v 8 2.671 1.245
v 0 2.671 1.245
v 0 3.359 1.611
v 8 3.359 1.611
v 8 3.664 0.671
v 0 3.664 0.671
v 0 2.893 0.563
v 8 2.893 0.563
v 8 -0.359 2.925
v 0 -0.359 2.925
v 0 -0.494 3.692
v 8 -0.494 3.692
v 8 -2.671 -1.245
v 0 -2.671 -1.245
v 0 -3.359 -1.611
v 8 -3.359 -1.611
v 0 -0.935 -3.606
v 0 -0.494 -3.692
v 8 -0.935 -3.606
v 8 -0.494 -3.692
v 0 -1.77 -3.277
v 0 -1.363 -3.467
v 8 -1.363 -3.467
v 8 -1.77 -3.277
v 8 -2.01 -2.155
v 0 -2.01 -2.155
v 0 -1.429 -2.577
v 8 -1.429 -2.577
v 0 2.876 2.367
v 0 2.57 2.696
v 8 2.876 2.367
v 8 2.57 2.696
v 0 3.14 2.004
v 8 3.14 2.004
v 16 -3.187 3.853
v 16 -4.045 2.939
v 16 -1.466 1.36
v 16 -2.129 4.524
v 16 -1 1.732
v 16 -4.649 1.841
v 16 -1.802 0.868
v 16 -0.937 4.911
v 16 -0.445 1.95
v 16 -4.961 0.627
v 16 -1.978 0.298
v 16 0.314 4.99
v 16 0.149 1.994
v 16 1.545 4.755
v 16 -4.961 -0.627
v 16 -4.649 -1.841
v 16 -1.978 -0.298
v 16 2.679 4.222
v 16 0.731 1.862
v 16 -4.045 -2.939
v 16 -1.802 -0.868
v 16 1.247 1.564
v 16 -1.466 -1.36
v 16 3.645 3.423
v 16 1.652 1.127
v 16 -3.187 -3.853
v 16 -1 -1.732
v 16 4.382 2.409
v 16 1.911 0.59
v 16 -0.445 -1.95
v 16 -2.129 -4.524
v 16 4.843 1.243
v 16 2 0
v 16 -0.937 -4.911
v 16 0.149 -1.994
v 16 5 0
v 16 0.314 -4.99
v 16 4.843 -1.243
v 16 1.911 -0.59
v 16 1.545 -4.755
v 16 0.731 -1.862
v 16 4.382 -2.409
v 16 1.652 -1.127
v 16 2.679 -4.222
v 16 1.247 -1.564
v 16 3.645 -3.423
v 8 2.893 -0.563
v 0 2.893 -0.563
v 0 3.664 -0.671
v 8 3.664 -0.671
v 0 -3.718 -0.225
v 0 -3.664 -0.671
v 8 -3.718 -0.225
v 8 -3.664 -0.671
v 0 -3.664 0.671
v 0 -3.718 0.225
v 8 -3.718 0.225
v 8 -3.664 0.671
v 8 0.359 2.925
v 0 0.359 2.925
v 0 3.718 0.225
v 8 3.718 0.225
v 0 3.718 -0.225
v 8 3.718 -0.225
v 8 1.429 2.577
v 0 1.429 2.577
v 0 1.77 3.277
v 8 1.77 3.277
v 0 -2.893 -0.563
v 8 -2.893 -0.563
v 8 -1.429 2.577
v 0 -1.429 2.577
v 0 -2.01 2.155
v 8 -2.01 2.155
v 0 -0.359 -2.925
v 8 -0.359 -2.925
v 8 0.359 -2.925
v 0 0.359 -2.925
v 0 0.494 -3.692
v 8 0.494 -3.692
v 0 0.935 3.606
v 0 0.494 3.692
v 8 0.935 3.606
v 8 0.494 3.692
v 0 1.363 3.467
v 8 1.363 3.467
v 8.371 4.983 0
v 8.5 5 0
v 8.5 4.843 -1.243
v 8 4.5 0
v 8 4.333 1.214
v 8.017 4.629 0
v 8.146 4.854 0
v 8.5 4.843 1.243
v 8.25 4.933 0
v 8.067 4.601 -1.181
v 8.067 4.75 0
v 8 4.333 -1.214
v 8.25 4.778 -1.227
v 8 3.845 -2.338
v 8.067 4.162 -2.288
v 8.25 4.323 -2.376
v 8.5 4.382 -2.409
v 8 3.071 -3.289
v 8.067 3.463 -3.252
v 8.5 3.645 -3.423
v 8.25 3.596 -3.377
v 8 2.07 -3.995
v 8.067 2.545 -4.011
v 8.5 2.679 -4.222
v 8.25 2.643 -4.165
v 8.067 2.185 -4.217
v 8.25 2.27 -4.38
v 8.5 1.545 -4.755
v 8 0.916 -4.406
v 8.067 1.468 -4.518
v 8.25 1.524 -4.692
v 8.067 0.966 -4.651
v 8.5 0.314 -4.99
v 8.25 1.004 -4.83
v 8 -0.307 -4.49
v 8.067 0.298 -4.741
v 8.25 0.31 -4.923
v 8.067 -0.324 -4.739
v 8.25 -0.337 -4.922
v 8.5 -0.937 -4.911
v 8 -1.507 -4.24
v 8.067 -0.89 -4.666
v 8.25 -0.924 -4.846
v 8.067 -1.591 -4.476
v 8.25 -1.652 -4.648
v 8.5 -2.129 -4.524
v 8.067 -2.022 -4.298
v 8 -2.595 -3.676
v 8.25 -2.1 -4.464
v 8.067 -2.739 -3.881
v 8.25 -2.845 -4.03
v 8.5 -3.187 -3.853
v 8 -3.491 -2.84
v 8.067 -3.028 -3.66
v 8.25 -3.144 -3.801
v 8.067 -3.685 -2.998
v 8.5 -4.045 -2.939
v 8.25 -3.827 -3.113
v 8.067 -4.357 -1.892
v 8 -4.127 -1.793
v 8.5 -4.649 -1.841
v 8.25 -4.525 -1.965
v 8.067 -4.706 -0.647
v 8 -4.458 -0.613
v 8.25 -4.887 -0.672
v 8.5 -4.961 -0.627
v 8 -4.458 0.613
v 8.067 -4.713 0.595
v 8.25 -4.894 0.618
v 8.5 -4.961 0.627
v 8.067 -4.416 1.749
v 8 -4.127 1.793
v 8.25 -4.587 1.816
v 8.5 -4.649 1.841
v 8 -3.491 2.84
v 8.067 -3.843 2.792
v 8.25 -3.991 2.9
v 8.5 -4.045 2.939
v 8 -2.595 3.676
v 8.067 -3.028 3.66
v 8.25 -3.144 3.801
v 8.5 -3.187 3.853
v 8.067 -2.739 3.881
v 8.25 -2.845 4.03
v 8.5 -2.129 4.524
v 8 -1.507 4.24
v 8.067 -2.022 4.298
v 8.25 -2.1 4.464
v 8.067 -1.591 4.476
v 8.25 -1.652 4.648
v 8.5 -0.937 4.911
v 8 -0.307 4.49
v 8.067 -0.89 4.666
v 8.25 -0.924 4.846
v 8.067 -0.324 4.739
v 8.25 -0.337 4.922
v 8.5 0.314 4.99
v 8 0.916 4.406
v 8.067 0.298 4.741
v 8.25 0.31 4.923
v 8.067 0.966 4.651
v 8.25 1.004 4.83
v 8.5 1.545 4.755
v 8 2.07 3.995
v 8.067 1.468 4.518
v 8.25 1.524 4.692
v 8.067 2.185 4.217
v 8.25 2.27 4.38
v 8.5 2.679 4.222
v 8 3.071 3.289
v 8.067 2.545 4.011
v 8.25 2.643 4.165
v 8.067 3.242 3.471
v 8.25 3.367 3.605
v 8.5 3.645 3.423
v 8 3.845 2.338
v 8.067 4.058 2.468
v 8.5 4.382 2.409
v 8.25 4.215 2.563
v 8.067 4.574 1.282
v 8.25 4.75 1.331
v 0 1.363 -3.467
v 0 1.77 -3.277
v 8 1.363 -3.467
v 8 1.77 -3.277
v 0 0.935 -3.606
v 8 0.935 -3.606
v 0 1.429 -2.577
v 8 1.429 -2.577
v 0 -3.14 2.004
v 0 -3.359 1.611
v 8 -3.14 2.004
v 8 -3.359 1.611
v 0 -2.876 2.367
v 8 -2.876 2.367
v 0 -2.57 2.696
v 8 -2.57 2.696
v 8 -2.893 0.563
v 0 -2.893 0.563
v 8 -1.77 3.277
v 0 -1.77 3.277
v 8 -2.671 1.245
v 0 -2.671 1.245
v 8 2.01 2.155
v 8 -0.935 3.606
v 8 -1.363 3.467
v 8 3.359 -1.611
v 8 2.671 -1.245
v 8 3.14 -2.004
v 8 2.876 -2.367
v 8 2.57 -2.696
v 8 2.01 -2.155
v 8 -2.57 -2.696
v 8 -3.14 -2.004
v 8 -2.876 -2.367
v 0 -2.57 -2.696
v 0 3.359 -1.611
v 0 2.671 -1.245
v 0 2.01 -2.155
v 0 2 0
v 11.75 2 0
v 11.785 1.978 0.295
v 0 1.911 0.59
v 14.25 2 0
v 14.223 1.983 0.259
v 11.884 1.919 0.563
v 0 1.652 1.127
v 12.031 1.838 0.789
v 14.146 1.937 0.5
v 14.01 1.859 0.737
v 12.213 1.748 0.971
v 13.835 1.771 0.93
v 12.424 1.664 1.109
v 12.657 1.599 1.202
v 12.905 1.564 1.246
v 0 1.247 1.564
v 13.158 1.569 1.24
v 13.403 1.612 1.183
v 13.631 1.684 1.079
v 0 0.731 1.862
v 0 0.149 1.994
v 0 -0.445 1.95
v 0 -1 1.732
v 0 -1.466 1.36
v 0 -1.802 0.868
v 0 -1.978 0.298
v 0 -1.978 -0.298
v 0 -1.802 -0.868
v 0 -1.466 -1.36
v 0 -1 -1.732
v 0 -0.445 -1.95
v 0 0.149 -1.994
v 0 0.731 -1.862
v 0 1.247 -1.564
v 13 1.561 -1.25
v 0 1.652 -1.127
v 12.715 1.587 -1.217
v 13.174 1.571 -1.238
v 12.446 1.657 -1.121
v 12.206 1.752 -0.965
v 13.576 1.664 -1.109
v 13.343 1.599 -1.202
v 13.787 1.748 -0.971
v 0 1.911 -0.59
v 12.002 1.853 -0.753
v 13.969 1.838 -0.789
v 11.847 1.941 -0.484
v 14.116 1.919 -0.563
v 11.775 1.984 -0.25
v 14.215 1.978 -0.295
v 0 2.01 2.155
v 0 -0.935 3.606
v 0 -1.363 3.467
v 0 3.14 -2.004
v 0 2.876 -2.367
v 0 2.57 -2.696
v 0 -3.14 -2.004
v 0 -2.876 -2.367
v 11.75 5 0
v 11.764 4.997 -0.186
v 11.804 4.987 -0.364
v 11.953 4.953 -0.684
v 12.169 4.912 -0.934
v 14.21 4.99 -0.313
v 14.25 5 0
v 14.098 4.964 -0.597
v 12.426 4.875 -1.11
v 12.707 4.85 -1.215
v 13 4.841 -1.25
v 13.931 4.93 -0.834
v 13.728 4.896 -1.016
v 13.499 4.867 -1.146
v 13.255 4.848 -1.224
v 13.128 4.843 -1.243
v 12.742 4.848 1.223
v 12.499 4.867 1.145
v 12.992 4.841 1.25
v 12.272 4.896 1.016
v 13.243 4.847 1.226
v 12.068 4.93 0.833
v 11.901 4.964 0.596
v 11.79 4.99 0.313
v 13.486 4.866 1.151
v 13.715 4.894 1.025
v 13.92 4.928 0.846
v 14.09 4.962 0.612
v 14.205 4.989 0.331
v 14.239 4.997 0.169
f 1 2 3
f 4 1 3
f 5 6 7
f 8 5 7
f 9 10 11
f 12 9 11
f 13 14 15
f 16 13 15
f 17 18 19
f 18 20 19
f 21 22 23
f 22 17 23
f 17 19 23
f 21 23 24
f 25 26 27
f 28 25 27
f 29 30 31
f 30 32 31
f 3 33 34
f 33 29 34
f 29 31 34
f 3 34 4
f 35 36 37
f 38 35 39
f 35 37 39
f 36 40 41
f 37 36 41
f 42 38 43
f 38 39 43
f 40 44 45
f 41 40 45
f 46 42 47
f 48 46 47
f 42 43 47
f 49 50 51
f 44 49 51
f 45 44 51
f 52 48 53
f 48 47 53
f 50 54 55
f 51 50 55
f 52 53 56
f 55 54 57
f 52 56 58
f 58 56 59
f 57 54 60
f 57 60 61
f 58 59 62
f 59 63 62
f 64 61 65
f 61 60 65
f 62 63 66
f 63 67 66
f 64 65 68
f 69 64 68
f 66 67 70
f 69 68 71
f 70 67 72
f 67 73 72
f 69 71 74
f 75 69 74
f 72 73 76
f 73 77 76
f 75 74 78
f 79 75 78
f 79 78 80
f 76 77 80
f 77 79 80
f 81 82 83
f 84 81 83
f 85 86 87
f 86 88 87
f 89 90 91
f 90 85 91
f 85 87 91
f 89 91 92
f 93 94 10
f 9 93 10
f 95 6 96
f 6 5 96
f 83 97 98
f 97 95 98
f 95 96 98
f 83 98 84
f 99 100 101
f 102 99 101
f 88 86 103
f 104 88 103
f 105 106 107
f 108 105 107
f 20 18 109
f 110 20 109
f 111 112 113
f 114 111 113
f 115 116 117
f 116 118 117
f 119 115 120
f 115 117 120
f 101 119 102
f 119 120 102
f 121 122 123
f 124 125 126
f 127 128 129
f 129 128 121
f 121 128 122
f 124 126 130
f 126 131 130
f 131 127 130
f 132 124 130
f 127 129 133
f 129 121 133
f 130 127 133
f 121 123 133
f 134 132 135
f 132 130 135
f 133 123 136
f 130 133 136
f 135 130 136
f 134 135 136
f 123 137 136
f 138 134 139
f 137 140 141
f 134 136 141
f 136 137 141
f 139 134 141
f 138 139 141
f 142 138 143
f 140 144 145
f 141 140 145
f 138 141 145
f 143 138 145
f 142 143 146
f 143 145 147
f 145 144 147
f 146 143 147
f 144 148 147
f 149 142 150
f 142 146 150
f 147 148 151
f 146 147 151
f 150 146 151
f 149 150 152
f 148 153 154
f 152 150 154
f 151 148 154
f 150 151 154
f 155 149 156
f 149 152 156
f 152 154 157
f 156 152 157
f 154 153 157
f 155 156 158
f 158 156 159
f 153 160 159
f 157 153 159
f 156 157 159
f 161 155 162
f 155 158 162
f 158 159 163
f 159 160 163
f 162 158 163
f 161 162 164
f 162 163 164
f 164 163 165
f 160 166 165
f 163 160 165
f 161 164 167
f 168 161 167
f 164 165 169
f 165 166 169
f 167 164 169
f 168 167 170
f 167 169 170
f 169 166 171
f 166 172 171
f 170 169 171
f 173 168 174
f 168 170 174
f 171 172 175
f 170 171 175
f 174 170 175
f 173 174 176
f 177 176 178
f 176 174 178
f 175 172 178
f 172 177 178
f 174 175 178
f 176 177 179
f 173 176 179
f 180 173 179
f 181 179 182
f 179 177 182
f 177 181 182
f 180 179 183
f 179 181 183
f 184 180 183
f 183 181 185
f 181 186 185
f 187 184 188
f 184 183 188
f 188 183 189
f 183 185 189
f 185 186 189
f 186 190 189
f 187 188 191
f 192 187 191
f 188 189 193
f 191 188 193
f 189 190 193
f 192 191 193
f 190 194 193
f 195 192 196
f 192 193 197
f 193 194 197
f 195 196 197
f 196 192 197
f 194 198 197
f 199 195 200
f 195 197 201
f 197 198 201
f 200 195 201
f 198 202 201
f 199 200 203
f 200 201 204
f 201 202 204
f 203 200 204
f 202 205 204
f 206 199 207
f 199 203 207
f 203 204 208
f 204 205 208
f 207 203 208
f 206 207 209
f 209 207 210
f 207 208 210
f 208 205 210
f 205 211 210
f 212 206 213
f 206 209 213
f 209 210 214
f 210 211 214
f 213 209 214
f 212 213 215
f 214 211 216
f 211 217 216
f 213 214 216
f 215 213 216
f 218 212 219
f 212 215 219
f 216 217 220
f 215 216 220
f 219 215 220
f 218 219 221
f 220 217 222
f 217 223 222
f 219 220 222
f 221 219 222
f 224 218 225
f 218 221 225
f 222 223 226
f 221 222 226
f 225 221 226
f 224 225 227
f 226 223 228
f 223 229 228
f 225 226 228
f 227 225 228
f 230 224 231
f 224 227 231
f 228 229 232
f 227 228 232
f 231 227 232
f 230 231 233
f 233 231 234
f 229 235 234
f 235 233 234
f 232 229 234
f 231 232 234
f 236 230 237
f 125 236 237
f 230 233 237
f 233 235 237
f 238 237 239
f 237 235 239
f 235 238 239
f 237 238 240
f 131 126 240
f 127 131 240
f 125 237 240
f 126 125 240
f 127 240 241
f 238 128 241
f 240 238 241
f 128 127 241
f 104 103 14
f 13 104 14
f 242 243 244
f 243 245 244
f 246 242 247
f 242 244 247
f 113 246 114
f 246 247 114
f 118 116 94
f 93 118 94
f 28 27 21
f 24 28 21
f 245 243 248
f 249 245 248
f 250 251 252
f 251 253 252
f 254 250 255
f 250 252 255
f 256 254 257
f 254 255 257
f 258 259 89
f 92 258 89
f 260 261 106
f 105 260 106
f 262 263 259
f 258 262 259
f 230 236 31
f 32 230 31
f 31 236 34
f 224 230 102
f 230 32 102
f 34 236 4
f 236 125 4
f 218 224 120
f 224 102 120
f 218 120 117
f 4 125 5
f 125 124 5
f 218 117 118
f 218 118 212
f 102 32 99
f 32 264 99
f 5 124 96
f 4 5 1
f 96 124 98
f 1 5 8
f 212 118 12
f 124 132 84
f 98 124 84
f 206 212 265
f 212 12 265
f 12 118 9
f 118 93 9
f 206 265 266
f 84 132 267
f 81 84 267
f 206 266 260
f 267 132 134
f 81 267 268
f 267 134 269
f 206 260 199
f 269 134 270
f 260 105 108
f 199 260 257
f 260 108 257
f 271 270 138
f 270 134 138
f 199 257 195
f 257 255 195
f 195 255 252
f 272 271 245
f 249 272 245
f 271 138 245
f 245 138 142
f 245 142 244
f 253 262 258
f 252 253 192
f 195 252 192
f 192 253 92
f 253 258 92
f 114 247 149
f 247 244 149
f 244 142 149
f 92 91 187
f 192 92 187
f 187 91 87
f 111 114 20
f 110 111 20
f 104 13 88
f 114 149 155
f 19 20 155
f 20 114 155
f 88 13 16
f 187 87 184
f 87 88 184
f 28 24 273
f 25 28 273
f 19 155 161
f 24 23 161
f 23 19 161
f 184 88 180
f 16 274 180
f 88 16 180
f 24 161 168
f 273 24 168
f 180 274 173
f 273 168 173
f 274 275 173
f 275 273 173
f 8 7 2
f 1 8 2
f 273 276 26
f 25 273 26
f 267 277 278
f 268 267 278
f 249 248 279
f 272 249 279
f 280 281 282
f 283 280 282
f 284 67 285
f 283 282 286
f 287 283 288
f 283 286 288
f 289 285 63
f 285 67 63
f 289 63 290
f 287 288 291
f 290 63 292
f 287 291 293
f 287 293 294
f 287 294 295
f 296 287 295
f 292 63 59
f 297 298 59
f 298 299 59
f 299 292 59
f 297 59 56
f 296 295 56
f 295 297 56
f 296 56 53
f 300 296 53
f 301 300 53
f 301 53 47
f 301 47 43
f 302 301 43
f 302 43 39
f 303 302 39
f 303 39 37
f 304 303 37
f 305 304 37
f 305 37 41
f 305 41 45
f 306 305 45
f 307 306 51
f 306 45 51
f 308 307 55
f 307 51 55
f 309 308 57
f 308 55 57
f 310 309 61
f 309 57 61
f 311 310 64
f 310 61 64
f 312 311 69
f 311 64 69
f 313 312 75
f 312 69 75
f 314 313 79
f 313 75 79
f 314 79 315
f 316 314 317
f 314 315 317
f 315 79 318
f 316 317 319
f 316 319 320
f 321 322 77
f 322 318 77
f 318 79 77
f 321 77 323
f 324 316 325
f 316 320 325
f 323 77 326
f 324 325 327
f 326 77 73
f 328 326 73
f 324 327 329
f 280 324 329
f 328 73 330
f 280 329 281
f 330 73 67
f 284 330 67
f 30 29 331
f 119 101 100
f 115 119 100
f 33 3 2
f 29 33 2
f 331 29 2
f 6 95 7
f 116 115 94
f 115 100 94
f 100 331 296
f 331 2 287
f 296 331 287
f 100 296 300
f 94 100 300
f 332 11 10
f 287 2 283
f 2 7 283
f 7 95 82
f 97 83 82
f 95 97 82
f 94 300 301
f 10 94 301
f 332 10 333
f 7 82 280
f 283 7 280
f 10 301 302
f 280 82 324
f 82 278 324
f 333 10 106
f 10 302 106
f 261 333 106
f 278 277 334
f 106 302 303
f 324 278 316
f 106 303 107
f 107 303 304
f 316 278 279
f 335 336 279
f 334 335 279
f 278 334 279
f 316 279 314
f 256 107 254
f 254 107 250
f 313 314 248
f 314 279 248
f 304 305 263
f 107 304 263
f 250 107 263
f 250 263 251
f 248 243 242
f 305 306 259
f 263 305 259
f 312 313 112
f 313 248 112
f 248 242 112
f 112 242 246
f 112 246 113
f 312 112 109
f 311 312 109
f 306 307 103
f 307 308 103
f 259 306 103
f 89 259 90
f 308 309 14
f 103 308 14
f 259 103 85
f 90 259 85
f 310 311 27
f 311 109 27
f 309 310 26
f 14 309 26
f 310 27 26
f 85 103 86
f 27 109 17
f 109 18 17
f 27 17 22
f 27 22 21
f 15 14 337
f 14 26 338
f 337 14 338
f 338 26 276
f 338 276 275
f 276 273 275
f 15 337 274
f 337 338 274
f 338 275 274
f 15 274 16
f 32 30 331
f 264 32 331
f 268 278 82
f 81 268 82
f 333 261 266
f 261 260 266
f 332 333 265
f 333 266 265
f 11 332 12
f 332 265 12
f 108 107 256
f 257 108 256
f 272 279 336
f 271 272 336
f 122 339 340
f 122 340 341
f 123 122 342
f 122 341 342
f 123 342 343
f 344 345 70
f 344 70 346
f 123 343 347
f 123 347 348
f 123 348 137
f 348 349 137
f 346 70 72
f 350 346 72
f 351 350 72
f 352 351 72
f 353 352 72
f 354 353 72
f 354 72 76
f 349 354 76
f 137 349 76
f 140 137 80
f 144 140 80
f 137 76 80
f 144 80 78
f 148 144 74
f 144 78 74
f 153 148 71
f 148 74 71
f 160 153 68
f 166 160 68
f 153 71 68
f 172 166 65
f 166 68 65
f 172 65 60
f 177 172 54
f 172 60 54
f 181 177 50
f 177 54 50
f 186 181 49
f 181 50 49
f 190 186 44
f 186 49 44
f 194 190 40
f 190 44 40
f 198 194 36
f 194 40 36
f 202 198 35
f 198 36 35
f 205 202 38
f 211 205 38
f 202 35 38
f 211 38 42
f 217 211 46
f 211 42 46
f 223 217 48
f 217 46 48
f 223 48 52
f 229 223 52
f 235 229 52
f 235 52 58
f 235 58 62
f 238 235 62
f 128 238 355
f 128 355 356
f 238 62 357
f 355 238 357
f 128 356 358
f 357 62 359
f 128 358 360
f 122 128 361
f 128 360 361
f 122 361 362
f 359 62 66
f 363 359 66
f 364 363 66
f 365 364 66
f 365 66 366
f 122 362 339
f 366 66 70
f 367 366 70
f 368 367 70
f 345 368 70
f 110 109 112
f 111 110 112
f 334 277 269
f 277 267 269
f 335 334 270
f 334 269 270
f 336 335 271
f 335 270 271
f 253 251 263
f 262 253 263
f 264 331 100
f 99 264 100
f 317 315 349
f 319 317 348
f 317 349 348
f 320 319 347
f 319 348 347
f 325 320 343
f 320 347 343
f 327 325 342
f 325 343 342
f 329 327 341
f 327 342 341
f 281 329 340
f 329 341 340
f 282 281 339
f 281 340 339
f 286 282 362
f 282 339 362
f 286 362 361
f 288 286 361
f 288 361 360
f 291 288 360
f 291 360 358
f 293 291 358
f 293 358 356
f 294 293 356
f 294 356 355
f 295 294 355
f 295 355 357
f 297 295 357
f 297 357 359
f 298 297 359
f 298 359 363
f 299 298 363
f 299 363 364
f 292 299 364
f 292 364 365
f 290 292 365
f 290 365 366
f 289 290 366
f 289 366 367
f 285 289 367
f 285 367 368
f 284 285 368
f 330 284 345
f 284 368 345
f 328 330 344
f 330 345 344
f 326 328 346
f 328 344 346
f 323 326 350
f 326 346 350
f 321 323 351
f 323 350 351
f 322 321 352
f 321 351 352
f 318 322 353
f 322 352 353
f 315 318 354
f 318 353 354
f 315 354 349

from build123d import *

# Parameters (mm, degrees)
ESQUISSE2_R                  = 2
ENL_V_MAT_EXTRU_1_DEPTH      = 17
CONG_1_R                     = 0.5
ENL_V_MAT_EXTRU_2_DEPTH      = 8
R_P_TITION_CIRCULAIRE1_COUNT = 10
ESQUISSE4_W                  = 1.25
ESQUISSE4_H                  = 5


with BuildPart() as part:
    # Esquisse1 → Révolution1 (revolve)
    with BuildSketch(Plane.XY):
        Polygon((0, 0), (0, 3.725), (8, 3.725), (8, 5), (16, 5), (16, 0), align=None)
    revolve(axis=Axis((16, 0, 0), (-1, 0, 0)))

    # Esquisse2 → Enlèv. mat.-Extru.1 (cut, through all)
    with BuildSketch(Plane(origin=(16, 0, 0), x_dir=(0, 0, -1), z_dir=(1, 0, 0))):
        with Locations(Location((0, 0, 0), (0, 0, 90))):  # turned: the seam where the file's is
            Circle(ESQUISSE2_R)
    extrude(amount=-ENL_V_MAT_EXTRU_1_DEPTH, mode=Mode.SUBTRACT)

    # Congé1
    cong_1_edges = [part.edges().sort_by_distance(p)[0] for p in [
        (8, -5, 0),
    ]]
    fillet(cong_1_edges, radius=CONG_1_R)

    # Esquisse3 → Enlèv. mat.-Extru.2 (cut)
    with BuildSketch(Plane.ZY):
        Polygon((0.675560046, 3.69719402), (0.56250399, 2.89275838), (1.245245427, 2.67092224), (1.626616562, 3.388177026), align=None)
    enl_v_mat_extru_2 = extrude(amount=-ENL_V_MAT_EXTRU_2_DEPTH, mode=Mode.SUBTRACT)

    # Répétition circulaire1: Enlèv. mat.-Extru.2 ×10 about axis
    r_p_tition_circulaire1_axis = Axis((0, 0, 0), (1, 0, 0))
    for i in range(1, R_P_TITION_CIRCULAIRE1_COUNT):
        add(enl_v_mat_extru_2.rotate(r_p_tition_circulaire1_axis, i * 360 / R_P_TITION_CIRCULAIRE1_COUNT), mode=Mode.SUBTRACT)

    # Esquisse4 → Trou taraudé M31 (revolve, cut)
    with BuildSketch(Plane(origin=(13, 0, 0), x_dir=(0, 0, -1), z_dir=(1, 0, 0))):
        with Locations((0.625, 2.5)):
            Rectangle(ESQUISSE4_W, ESQUISSE4_H)
    revolve(axis=Axis((13, -6.35, 0), (0, 1, 0)), mode=Mode.SUBTRACT)


solid = part.part
